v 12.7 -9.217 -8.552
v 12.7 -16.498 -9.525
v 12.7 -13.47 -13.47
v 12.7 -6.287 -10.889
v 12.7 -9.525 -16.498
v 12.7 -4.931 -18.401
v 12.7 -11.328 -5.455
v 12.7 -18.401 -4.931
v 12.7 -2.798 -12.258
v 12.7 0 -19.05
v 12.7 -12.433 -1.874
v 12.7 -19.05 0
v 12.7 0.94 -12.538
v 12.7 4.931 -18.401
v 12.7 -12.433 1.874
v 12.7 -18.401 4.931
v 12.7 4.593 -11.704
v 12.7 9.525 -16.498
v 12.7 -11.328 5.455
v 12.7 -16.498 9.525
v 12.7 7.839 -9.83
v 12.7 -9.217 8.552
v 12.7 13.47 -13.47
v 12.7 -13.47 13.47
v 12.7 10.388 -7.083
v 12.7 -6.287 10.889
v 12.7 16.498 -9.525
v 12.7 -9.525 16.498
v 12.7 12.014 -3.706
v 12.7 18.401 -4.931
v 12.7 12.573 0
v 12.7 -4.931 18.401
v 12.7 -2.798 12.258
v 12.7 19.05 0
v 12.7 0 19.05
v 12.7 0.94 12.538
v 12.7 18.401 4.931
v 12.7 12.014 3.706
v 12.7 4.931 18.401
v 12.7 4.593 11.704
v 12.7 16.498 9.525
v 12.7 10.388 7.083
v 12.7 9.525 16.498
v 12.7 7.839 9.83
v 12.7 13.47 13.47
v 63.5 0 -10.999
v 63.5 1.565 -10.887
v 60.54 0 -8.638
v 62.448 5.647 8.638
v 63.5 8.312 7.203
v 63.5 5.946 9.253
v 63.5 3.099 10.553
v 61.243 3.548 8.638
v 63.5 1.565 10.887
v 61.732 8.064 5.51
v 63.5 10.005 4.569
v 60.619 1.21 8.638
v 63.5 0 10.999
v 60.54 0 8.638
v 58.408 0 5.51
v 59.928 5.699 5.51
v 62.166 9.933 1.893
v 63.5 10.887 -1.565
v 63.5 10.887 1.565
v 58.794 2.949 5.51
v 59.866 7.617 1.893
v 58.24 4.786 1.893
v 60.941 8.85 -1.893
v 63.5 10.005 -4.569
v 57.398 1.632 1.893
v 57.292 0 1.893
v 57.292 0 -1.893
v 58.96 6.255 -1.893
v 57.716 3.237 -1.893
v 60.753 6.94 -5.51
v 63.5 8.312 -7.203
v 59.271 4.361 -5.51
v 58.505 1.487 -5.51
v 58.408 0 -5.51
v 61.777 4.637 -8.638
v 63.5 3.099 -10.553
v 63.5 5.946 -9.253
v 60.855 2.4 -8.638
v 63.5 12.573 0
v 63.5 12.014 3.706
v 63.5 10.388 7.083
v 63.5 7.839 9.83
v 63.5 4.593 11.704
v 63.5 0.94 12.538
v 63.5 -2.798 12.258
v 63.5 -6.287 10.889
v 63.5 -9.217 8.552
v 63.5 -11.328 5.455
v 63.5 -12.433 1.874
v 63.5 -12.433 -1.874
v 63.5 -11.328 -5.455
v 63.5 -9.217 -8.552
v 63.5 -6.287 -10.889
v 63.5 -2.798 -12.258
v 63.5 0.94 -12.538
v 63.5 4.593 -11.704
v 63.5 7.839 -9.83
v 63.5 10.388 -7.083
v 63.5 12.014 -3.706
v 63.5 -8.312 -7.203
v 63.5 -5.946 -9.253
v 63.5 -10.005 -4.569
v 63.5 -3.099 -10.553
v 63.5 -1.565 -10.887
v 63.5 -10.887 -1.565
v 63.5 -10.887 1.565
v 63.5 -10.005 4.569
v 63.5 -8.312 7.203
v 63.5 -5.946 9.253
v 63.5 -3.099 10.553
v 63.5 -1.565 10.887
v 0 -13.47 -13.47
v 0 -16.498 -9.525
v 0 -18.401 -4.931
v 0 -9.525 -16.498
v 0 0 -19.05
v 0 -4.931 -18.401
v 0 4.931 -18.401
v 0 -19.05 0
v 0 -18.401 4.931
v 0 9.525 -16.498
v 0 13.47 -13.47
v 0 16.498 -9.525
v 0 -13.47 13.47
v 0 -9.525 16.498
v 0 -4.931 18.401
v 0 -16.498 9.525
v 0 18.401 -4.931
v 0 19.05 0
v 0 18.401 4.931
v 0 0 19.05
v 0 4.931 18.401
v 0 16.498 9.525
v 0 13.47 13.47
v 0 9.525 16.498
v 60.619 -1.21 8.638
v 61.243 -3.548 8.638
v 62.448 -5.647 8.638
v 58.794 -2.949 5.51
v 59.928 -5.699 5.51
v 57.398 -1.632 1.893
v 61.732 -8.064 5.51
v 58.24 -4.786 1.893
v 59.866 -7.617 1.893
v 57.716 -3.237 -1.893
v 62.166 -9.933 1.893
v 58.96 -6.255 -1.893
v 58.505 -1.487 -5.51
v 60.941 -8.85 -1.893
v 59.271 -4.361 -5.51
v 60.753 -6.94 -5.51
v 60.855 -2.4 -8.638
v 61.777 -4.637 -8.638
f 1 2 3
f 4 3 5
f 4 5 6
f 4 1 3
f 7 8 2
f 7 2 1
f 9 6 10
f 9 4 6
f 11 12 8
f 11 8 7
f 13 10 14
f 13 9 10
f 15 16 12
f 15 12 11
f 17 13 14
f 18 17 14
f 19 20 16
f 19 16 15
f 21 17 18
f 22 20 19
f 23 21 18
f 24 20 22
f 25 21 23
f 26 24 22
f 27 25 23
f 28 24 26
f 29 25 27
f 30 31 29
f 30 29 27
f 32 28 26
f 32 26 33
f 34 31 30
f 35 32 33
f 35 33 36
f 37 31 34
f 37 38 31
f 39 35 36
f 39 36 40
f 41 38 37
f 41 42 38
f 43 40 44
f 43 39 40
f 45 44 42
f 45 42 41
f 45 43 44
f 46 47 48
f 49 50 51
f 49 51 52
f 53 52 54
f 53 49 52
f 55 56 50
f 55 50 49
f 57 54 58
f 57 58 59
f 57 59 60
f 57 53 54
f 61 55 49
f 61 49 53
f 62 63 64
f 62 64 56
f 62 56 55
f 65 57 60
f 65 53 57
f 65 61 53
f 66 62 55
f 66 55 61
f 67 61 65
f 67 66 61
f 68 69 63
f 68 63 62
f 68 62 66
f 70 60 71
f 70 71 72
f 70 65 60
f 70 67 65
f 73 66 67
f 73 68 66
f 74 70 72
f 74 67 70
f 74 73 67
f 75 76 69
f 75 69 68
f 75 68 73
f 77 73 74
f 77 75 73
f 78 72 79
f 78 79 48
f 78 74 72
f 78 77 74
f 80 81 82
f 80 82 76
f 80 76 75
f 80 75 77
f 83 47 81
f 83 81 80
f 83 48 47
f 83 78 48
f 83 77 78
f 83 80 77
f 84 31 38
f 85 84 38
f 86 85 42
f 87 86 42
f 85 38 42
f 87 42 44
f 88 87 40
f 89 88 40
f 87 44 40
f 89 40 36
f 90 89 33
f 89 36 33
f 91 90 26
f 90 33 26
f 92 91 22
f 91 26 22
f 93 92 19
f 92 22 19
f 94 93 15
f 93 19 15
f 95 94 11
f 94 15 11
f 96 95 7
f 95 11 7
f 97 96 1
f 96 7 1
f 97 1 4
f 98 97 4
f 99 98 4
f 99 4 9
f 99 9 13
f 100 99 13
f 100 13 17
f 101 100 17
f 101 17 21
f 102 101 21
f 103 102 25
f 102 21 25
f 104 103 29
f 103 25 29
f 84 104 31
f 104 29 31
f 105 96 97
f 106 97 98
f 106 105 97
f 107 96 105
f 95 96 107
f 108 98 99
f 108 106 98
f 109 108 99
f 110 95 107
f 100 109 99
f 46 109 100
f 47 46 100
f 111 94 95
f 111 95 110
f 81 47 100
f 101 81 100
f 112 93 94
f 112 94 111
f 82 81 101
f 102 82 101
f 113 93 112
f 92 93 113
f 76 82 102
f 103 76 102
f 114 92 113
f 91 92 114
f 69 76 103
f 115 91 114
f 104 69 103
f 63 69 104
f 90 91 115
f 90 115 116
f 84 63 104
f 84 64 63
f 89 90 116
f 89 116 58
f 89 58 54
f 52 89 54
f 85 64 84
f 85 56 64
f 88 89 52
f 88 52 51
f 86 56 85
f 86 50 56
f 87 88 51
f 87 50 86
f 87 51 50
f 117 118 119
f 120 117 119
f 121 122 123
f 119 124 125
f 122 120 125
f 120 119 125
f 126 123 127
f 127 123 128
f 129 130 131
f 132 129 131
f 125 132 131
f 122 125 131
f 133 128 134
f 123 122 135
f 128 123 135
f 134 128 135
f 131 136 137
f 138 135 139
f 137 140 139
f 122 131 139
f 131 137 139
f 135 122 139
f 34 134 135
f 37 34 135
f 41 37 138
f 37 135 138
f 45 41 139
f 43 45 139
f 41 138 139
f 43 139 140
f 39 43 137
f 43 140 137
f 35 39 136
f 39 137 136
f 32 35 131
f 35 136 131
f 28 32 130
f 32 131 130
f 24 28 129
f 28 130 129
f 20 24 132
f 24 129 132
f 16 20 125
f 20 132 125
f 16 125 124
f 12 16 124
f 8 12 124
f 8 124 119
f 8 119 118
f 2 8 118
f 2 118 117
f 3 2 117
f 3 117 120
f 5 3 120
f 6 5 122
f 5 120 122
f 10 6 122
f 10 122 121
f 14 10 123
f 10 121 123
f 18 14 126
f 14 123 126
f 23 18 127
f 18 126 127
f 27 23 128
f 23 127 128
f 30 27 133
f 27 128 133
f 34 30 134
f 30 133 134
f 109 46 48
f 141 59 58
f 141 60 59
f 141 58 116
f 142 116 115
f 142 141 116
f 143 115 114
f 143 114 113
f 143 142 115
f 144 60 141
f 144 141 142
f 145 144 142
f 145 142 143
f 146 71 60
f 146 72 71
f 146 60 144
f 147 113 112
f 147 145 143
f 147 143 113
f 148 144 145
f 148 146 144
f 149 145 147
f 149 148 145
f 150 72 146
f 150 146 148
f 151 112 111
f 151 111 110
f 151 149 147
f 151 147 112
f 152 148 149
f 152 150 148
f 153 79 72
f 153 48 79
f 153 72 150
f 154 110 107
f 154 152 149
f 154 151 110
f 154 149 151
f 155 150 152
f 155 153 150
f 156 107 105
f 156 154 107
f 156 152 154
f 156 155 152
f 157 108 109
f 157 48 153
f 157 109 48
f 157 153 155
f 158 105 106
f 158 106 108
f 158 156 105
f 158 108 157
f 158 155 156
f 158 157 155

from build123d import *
from build123d import SkipClean  # not in build123d's __all__

# Parameters (mm, degrees)
F0_R     = 19.05
F1_DEPTH = 12.7
F2_R     = 12.573
F3_DEPTH = 50.8


with BuildPart() as f1:
    # F0 (on Right) → F1 (new body)
    with BuildSketch(Plane.YZ):
        Circle(F0_R)
    extrude(amount=F1_DEPTH)

    # F2 (on face) → F3 (join)
    with BuildSketch(Plane.YZ.offset(12.7)):
        Circle(F2_R)
    extrude(amount=F3_DEPTH)

    # F4 (on Front) → F5 (revolve, cut)
    with BuildSketch(Plane.XZ):
        with BuildLine():
            Line((69.85, -12.7), (69.85, 12.7))
            ThreePointArc((69.85, 12.7), (57.15, 0), (69.85, -12.7))
        make_face()
    with SkipClean():  # cleaning this boolean's faces spoils the solid; the shape is the same uncleaned
        revolve(axis=Axis((69.85, 0, 17.1570373535), (0, 0, 1)), mode=Mode.SUBTRACT)


solid = f1.part
